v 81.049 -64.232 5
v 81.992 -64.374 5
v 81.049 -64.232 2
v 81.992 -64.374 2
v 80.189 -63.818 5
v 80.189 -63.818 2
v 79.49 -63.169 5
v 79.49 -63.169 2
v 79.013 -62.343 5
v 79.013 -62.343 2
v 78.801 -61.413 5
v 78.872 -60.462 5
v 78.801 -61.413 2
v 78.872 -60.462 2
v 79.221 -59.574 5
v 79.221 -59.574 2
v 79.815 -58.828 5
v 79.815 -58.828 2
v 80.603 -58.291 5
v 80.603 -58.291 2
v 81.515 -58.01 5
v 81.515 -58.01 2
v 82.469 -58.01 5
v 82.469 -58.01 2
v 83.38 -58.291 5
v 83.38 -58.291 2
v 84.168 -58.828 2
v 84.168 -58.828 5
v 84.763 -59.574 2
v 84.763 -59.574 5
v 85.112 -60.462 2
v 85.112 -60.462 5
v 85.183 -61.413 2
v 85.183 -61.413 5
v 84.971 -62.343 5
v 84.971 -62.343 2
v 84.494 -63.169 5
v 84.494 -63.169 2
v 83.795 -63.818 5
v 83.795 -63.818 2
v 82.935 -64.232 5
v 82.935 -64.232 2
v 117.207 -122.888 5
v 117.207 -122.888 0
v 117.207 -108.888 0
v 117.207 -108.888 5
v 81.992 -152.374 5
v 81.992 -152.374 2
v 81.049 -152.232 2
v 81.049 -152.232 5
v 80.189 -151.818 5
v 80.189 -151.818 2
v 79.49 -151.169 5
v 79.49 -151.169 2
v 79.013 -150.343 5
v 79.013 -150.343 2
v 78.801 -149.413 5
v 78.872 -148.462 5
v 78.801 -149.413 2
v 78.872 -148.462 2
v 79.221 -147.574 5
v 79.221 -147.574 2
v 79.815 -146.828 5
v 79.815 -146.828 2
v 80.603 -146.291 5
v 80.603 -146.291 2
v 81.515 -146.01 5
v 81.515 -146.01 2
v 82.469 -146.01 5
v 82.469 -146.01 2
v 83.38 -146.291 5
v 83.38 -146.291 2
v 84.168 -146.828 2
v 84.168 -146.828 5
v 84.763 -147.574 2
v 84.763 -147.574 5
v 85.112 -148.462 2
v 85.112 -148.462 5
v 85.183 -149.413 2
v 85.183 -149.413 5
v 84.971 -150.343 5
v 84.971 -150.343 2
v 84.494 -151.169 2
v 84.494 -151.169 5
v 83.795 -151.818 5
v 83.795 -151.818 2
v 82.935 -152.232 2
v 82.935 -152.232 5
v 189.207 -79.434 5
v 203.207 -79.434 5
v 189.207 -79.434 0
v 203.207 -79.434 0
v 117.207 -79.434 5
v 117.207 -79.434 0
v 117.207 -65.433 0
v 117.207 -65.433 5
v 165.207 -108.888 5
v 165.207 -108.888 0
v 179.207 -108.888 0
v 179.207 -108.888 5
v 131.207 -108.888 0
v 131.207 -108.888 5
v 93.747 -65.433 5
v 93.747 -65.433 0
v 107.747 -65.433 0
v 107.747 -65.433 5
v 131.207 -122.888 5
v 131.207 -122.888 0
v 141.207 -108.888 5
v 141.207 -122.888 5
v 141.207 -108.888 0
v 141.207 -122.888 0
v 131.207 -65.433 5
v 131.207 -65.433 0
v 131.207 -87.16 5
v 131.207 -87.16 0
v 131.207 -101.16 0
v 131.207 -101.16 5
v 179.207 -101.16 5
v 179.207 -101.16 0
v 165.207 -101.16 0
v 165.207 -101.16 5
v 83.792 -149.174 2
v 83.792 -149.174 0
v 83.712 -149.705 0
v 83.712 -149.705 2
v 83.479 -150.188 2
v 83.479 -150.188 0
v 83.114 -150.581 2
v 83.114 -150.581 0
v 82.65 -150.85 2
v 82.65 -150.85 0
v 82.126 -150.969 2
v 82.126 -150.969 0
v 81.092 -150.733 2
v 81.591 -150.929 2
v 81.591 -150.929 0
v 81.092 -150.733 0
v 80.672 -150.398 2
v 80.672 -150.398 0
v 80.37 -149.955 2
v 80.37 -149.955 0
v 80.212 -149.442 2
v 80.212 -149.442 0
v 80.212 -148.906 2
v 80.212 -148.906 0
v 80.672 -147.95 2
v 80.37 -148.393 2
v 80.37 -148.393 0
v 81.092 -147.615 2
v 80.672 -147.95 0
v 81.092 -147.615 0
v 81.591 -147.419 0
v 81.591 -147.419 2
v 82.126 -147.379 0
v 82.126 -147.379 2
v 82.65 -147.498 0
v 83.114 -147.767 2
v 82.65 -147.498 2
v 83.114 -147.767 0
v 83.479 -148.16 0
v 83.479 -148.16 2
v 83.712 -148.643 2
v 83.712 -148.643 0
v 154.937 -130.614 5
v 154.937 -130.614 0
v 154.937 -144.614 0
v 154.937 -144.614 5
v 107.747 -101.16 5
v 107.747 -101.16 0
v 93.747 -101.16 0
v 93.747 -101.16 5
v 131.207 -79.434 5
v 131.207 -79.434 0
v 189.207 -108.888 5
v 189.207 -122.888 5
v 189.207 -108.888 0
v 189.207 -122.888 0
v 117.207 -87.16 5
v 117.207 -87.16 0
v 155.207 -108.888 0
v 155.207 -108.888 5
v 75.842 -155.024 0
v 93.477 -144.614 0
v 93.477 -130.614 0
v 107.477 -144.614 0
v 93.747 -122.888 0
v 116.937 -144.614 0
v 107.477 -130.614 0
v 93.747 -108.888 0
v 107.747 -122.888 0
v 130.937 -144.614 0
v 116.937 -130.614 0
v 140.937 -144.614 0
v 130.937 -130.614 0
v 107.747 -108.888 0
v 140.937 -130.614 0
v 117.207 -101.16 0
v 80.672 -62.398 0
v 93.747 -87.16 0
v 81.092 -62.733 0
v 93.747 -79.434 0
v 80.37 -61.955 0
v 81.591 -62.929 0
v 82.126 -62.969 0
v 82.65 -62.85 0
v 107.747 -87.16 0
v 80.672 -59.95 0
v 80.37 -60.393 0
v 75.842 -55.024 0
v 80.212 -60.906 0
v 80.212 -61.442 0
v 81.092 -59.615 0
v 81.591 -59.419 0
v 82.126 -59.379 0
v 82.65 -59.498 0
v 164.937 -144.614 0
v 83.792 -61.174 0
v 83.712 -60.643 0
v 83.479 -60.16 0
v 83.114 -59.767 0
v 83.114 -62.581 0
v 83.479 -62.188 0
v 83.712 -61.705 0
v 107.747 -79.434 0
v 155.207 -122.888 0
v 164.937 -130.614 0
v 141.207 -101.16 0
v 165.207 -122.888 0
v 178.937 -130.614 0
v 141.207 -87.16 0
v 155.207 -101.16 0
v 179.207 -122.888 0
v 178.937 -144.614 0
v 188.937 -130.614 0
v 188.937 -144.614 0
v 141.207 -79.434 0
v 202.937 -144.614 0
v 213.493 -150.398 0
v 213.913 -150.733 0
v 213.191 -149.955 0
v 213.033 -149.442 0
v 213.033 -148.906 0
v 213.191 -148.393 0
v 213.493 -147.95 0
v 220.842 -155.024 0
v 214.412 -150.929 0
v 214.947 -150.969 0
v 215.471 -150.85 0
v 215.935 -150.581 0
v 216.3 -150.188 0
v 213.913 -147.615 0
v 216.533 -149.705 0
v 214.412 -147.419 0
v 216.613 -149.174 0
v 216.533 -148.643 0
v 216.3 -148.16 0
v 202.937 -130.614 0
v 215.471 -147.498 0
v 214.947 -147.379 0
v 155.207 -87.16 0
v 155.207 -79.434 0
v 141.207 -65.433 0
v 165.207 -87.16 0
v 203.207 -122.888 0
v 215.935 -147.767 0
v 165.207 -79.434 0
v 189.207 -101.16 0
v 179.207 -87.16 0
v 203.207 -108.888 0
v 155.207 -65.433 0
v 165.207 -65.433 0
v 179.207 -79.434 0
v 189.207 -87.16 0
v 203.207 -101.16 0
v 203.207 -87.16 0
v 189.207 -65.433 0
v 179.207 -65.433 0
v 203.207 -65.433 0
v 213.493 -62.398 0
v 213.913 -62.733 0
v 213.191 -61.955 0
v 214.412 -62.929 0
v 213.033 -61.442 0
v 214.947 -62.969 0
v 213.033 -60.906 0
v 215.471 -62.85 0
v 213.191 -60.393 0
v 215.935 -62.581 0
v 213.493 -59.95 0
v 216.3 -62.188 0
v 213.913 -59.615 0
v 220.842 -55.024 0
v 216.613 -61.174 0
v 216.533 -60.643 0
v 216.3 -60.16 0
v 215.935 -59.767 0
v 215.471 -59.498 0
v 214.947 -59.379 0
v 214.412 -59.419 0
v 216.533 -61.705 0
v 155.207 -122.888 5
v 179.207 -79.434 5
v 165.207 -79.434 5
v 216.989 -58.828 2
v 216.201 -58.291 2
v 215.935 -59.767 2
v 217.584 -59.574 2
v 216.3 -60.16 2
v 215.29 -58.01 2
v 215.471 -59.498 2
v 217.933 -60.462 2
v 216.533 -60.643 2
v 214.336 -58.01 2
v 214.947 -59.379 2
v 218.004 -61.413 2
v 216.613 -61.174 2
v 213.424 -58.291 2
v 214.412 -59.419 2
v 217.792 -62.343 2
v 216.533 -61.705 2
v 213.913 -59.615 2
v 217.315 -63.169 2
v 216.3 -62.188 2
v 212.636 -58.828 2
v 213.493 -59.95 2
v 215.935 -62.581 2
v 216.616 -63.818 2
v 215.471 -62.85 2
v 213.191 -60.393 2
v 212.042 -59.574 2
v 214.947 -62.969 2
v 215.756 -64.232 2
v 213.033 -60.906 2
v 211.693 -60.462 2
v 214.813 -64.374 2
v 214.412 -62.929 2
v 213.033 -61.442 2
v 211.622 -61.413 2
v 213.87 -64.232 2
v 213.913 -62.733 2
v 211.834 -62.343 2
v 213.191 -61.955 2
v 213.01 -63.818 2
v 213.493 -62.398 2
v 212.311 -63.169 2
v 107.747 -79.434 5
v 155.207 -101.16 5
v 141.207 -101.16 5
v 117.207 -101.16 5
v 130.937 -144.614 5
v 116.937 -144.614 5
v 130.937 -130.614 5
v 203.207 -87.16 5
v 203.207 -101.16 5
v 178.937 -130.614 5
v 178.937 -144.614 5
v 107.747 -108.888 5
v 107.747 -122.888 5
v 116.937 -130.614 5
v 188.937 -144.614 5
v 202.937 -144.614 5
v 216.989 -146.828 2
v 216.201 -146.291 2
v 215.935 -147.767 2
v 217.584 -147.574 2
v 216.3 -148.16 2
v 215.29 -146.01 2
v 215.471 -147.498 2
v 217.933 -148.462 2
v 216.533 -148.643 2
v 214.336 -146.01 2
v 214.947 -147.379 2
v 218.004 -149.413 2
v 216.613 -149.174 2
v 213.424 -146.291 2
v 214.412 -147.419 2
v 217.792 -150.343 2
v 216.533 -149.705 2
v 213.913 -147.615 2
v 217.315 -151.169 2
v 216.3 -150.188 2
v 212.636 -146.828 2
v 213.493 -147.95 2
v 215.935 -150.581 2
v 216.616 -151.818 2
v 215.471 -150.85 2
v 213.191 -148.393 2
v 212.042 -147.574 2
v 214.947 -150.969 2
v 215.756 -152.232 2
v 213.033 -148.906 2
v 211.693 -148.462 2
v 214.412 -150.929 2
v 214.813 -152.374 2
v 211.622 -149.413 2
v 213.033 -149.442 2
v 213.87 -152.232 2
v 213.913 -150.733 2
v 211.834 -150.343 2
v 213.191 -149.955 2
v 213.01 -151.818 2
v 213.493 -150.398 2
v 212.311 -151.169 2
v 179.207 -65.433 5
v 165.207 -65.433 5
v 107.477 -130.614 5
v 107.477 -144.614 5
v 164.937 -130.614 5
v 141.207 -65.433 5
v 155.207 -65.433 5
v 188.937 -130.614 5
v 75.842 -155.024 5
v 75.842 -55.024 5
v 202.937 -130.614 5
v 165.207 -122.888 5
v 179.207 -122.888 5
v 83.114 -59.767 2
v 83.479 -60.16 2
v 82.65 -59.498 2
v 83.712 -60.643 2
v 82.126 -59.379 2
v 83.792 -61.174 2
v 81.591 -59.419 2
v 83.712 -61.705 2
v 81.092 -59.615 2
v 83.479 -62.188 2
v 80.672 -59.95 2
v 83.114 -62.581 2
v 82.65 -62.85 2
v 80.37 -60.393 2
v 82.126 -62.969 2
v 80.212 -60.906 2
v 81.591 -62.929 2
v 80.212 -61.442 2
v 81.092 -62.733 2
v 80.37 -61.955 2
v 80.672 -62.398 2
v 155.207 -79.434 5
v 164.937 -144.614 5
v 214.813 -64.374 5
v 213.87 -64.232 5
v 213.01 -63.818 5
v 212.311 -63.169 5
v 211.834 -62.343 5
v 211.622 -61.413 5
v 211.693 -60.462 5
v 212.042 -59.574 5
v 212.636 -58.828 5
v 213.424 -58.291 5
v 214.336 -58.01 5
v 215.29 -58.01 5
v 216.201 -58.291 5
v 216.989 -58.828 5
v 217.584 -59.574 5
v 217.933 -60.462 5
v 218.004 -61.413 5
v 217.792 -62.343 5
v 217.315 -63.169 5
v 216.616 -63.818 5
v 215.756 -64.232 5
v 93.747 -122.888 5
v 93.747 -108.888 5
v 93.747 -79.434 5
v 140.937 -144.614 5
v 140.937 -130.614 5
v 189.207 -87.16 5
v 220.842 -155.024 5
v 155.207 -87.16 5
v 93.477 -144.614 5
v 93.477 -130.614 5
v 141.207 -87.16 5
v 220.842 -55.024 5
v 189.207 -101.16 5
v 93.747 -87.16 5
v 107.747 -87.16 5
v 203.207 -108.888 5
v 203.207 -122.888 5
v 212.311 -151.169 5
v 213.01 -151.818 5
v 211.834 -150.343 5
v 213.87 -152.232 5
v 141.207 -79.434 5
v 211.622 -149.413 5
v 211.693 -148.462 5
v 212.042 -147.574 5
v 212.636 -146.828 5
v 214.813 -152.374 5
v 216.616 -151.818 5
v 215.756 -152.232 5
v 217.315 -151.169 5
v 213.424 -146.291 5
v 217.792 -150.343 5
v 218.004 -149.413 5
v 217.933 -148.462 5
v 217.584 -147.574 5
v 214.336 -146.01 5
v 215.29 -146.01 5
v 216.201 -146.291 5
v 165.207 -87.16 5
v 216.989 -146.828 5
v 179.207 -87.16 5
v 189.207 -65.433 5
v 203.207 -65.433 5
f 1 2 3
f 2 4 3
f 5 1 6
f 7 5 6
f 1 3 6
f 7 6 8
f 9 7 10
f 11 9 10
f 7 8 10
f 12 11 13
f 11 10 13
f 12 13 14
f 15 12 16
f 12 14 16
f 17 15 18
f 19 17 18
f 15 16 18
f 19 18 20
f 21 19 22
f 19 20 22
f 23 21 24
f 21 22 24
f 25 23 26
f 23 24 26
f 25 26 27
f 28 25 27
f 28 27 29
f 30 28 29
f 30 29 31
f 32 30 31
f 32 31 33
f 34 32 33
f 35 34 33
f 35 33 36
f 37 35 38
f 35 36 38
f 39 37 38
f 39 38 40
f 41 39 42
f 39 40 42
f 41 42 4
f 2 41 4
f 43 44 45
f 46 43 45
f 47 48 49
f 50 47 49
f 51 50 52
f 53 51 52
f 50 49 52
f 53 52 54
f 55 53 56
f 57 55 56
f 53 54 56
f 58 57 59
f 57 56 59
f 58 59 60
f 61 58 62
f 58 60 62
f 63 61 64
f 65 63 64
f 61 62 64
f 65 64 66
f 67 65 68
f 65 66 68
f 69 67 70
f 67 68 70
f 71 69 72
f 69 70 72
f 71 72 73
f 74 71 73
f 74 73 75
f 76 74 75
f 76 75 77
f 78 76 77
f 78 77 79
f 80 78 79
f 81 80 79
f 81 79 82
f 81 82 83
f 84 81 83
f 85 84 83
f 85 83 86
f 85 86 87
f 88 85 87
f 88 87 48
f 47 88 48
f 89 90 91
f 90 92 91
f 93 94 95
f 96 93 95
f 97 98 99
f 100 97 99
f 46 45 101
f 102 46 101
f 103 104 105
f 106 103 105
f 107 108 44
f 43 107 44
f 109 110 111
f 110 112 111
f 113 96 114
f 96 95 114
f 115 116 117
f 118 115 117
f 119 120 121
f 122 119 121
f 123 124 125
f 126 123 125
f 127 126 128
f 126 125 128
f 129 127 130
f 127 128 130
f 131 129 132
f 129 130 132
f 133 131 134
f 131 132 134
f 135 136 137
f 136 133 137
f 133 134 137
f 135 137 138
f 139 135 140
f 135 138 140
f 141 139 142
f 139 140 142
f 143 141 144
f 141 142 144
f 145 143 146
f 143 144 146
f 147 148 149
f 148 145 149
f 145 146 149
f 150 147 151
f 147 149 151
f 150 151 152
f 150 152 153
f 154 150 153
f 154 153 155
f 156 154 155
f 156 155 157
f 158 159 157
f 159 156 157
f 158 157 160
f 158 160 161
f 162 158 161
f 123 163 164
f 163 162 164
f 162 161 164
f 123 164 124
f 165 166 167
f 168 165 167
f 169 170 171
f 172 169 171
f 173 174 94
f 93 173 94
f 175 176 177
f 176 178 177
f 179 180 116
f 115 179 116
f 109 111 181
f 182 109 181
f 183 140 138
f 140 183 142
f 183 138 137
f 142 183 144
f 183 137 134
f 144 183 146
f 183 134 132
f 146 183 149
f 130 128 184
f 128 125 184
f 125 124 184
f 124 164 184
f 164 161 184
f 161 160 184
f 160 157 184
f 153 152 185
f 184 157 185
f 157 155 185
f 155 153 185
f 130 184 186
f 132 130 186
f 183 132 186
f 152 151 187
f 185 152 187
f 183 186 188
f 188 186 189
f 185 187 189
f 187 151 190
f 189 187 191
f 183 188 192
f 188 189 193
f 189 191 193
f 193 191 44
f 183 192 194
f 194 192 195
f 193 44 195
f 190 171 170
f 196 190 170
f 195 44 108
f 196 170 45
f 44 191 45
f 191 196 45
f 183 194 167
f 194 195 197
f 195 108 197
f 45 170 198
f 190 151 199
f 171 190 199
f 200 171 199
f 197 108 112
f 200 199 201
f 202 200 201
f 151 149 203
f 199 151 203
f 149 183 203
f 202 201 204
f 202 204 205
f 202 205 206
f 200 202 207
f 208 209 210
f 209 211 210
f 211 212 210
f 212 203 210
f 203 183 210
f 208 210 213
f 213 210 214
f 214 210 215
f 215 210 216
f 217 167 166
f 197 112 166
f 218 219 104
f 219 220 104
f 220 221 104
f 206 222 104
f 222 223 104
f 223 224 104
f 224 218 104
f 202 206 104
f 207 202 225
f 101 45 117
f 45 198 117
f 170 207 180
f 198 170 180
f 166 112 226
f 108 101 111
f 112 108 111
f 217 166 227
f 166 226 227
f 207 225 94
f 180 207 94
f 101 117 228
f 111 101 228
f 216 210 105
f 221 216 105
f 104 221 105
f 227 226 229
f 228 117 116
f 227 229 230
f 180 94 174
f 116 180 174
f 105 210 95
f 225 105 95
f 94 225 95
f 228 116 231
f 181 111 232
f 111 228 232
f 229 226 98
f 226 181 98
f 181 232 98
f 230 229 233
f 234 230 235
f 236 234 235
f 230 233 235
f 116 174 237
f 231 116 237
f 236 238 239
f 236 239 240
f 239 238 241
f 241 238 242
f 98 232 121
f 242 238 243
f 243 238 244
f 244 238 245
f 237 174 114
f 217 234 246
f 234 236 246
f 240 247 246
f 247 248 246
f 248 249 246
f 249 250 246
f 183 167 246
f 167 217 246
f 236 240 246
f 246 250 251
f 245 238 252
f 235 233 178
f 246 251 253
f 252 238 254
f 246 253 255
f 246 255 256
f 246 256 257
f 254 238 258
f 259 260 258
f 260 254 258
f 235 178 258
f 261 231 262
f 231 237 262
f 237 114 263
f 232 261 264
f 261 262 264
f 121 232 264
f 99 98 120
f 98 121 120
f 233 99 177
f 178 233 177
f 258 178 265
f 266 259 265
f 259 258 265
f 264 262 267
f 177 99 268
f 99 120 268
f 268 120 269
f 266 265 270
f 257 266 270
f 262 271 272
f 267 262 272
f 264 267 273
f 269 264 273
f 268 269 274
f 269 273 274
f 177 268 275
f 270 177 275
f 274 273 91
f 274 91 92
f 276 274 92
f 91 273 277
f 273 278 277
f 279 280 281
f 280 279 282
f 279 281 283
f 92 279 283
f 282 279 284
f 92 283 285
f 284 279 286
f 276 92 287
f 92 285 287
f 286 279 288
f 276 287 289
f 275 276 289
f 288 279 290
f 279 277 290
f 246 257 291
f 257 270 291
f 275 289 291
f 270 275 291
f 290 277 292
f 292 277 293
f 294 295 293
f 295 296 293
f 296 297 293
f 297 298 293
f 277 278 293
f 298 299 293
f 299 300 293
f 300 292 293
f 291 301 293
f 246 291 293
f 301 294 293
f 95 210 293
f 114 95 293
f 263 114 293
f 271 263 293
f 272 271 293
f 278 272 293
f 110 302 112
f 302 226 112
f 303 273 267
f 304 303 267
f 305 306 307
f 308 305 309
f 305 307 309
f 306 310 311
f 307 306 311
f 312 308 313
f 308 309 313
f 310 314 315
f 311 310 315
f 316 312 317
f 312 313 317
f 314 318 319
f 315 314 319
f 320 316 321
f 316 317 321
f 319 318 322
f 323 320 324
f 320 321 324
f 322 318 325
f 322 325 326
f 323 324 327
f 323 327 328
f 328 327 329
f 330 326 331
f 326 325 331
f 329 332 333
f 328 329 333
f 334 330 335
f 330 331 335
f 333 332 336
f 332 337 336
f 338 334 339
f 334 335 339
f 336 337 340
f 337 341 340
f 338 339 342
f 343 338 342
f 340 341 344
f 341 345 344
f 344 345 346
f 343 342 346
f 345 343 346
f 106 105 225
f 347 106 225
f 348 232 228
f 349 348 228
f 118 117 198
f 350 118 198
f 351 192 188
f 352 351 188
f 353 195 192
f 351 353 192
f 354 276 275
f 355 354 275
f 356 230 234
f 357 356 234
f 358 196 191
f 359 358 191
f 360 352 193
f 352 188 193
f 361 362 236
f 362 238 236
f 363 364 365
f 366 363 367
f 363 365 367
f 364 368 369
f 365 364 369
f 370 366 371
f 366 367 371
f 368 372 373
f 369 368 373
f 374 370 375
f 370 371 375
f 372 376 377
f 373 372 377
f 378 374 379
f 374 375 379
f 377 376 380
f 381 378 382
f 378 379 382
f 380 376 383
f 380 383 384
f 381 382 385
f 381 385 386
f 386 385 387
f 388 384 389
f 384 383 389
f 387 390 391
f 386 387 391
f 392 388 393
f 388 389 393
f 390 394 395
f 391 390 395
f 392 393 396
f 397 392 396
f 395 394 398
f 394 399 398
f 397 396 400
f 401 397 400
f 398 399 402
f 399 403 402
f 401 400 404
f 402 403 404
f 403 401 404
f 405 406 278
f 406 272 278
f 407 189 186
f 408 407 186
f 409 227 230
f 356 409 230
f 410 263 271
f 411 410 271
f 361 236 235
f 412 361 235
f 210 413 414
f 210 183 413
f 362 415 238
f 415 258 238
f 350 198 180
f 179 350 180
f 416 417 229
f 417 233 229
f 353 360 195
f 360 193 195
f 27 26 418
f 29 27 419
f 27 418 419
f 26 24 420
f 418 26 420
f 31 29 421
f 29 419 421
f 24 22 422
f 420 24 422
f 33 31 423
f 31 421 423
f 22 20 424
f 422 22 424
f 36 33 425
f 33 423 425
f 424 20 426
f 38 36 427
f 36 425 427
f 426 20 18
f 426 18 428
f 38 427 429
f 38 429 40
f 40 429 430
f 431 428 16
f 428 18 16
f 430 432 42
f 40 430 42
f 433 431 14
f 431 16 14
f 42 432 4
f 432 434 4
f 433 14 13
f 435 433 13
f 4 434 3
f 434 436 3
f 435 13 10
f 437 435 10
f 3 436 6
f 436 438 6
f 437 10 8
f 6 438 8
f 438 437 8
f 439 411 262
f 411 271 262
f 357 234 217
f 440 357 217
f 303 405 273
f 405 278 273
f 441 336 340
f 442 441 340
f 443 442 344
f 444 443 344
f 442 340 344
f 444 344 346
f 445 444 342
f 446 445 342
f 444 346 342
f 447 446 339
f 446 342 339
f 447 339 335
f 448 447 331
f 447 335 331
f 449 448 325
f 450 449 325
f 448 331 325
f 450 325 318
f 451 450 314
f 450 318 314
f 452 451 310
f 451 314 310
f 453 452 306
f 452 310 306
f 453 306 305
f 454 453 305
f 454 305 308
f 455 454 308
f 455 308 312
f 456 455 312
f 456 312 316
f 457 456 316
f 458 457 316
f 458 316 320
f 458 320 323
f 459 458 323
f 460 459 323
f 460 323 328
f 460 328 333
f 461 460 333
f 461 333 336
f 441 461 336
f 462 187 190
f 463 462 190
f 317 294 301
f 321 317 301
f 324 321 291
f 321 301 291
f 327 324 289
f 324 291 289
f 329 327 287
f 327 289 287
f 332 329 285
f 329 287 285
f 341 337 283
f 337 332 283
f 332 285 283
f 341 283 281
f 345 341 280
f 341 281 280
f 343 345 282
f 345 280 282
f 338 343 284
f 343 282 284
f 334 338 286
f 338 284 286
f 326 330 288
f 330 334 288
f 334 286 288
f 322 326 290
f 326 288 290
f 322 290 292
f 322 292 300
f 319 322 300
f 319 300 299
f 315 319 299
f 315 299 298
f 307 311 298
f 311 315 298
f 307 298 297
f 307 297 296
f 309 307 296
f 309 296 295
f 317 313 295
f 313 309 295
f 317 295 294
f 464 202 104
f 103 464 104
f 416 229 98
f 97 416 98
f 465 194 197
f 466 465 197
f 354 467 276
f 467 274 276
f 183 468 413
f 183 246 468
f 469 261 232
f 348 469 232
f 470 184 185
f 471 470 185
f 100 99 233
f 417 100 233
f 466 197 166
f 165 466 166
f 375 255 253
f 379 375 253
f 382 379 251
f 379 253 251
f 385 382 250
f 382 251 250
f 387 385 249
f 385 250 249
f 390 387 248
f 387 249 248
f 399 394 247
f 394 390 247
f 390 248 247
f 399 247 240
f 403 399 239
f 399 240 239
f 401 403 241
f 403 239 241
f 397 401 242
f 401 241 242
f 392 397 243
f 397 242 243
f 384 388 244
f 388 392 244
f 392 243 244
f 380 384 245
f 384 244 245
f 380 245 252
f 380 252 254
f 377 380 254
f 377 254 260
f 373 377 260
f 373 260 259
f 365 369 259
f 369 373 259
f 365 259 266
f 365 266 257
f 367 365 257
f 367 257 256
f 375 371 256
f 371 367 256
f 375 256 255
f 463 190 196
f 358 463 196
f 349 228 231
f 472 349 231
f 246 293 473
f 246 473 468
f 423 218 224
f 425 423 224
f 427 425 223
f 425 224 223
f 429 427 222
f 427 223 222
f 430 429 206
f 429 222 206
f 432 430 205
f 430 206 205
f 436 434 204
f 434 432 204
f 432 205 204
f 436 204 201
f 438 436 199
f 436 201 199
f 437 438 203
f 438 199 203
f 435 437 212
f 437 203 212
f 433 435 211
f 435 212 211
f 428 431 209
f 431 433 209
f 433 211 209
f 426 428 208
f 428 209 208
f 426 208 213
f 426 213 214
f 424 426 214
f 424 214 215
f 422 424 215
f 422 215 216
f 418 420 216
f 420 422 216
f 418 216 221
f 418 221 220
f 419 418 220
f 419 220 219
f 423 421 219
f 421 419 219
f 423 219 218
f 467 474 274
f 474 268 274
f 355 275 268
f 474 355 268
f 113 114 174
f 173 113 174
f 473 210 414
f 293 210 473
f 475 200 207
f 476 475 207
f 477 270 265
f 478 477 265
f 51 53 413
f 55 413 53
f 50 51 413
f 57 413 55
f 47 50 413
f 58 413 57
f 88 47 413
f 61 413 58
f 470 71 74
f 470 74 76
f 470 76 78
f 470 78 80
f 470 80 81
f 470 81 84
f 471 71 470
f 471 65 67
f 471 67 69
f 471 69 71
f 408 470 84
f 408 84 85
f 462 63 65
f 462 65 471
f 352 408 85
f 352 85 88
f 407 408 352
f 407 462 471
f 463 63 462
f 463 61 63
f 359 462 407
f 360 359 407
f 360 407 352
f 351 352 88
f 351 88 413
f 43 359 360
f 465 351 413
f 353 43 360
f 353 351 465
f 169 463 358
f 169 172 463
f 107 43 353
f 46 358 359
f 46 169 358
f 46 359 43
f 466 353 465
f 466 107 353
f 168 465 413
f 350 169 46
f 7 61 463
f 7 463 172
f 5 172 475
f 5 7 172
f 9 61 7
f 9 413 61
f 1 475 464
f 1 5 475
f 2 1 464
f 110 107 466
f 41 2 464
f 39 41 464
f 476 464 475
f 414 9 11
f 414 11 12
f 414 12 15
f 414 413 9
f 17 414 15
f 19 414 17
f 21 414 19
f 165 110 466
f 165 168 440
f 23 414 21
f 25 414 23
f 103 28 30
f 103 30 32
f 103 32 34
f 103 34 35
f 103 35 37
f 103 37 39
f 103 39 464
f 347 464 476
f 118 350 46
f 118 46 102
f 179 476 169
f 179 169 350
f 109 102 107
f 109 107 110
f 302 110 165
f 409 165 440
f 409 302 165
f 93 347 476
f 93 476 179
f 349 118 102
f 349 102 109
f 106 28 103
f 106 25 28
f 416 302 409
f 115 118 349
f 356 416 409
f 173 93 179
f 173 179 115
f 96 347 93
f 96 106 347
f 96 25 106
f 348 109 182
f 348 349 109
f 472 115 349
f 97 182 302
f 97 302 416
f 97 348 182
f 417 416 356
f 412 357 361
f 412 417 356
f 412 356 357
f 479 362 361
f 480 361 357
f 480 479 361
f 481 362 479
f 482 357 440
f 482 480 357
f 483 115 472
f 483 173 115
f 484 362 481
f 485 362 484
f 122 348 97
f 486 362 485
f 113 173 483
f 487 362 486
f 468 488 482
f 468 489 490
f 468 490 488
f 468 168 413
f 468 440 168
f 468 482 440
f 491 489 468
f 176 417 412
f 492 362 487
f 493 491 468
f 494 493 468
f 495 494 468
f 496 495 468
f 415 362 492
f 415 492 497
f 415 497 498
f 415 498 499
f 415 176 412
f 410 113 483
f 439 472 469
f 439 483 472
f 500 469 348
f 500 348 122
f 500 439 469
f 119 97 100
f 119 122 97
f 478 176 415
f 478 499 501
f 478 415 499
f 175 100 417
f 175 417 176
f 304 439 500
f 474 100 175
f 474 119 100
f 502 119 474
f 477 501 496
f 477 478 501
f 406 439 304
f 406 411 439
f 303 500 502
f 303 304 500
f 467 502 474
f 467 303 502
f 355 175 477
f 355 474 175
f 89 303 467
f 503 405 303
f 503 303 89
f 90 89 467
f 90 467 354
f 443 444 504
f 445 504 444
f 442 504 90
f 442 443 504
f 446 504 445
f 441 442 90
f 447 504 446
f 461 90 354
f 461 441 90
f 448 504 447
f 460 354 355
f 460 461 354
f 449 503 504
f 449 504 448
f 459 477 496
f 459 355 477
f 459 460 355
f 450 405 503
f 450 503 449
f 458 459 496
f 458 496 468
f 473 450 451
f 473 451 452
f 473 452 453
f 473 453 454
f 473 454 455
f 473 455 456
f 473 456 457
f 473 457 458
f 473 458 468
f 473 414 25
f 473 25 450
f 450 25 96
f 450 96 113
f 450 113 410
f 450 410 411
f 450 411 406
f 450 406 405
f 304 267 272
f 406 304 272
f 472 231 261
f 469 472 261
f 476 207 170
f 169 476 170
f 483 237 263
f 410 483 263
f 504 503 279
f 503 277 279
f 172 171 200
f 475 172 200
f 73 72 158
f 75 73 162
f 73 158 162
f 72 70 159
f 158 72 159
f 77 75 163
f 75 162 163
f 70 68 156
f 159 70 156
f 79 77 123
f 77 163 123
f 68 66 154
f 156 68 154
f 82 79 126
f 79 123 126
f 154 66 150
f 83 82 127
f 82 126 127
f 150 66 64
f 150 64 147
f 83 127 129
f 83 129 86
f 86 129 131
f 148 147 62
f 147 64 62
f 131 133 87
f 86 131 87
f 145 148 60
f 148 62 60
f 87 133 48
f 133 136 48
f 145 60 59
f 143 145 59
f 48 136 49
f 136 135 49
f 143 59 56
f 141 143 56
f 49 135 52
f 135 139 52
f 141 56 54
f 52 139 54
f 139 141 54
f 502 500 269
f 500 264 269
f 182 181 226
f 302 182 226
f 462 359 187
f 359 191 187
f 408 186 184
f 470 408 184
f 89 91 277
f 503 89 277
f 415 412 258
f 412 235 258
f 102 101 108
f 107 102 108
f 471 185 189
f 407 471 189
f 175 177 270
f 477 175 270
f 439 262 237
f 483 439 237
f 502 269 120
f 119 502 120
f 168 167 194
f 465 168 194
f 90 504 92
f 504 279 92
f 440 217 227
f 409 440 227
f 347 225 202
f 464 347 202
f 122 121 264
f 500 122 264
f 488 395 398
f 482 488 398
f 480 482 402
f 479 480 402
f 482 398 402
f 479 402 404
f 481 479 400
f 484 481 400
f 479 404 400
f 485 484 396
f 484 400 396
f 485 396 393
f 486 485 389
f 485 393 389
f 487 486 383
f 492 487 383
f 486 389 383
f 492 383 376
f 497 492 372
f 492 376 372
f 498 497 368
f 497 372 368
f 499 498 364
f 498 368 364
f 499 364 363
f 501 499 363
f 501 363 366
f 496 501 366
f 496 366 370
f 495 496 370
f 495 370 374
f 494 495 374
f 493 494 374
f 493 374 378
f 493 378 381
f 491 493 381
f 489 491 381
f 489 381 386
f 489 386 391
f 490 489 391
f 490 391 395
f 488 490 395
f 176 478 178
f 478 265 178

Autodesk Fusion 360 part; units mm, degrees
sketch "Esquisse1" plane through (0, 0, 0) normal (0, 0, 1) x (1, 0, 0)
  line L0 (0.1341, -76.3658) -> (64.4137, -0.1129)
  line L1 (64.4137, -0.1129) -> (129.0708, -76.1647)
  line L2 (129.0708, -76.1647) -> (129.0708, -86.1624)
  line L3 (0.1341, -76.133) -> (11.9451, -86.0425)
  line L4 (129.2084, -85.9931) -> (11.8004, -85.9931)
sketch "Esquisse2" plane through (-56.9768, 0, 48.0303) normal (-0.7646, 0, 0.6445) x (0, -1, 0)
  line L0 (-20.1587, 188.3406) -> (-20.1587, 88.7874)
  line L1 (-20.1587, 88.7874) -> (127.8413, 88.7874)
  line L2 (127.8413, 88.7874) -> (127.8413, 188.3406)
  line L3 (127.8413, 188.3406) -> (-20.1587, 188.3406)
  line L4 (-18.8236, 187.8236) -> (126.1751, 187.8236)
  line L5 (126.1751, 187.8236) -> (126.1751, 87.8252)
  line L6 (126.1751, 87.8252) -> (-18.8236, 87.8252)
  line L7 (-18.8236, 87.8252) -> (-18.8236, 187.8236)
  line L8 (-3.8235, 175.0777) -> (11.1766, 175.0777)
  line L9 (11.1766, 175.0777) -> (11.1766, 160.0776)
  line L10 (11.1766, 160.0776) -> (-3.8235, 160.0776)
  line L11 (-3.8235, 160.0776) -> (-3.8235, 175.0777)
  line L12 (21.1779, 175.0777) -> (36.178, 175.0777)
  line L13 (36.178, 175.0777) -> (36.178, 160.0776)
  line L14 (36.178, 160.0776) -> (21.1779, 160.0776)
  line L15 (21.1779, 160.0776) -> (21.1779, 175.0777)
  line L16 (46.1757, 175.0777) -> (61.1758, 175.0777)
  line L17 (61.1758, 175.0777) -> (61.1758, 160.0776)
  line L18 (61.1758, 160.0776) -> (46.1757, 160.0776)
  line L19 (46.1757, 160.0776) -> (46.1757, 175.0777)
  line L20 (71.1771, 175.0777) -> (86.1772, 175.0777)
  line L21 (86.1772, 175.0777) -> (86.1772, 160.0776)
  line L22 (86.1772, 160.0776) -> (71.1771, 160.0776)
  line L23 (71.1771, 160.0776) -> (71.1771, 175.0777)
  line L24 (96.1749, 175.0777) -> (111.175, 175.0777)
  line L25 (111.175, 175.0777) -> (111.175, 160.0776)
  line L26 (111.175, 160.0776) -> (96.1749, 160.0776)
  line L27 (96.1749, 160.0776) -> (96.1749, 175.0777)
  line L28 (-3.8235, 155.1387) -> (11.1766, 155.1387)
  line L29 (11.1766, 155.1387) -> (11.1766, 140.1386)
  line L30 (11.1766, 140.1386) -> (-3.8235, 140.1386)
  line L31 (-3.8235, 140.1386) -> (-3.8235, 155.1387)
  line L32 (21.1779, 155.1387) -> (36.178, 155.1387)
  line L33 (36.178, 155.1387) -> (36.178, 140.1386)
  line L34 (36.178, 140.1386) -> (21.1779, 140.1386)
  line L35 (21.1779, 140.1386) -> (21.1779, 155.1387)
  line L36 (46.1757, 155.1387) -> (61.1758, 155.1387)
  line L37 (61.1758, 155.1387) -> (61.1758, 140.1386)
  line L38 (61.1758, 140.1386) -> (46.1757, 140.1386)
  line L39 (46.1757, 140.1386) -> (46.1757, 155.1387)
  line L40 (71.1771, 155.1387) -> (86.1772, 155.1387)
  line L41 (86.1772, 155.1387) -> (86.1772, 140.1386)
  line L42 (86.1772, 140.1386) -> (71.1771, 140.1386)
  line L43 (71.1771, 140.1386) -> (71.1771, 155.1387)
  line L44 (96.1749, 155.1387) -> (111.175, 155.1387)
  line L45 (111.175, 155.1387) -> (111.175, 140.1386)
  line L46 (111.175, 140.1386) -> (96.1749, 140.1386)
  line L47 (96.1749, 140.1386) -> (96.1749, 155.1387)
  line L48 (-3.8235, 135.1997) -> (11.1766, 135.1997)
  line L49 (11.1766, 135.1997) -> (11.1766, 120.1996)
  line L50 (11.1766, 120.1996) -> (-3.8235, 120.1996)
  line L51 (-3.8235, 120.1996) -> (-3.8235, 135.1997)
  line L52 (21.1779, 135.1997) -> (36.178, 135.1997)
  line L53 (36.178, 135.1997) -> (36.178, 120.1996)
  line L54 (36.178, 120.1996) -> (21.1779, 120.1996)
  line L55 (21.1779, 120.1996) -> (21.1779, 135.1997)
  line L56 (46.1757, 135.1997) -> (61.1758, 135.1997)
  line L57 (61.1758, 135.1997) -> (61.1758, 120.1996)
  line L58 (61.1758, 120.1996) -> (46.1757, 120.1996)
  line L59 (46.1757, 120.1996) -> (46.1757, 135.1997)
  line L60 (71.1771, 135.1997) -> (86.1772, 135.1997)
  line L61 (86.1772, 135.1997) -> (86.1772, 120.1996)
  line L62 (86.1772, 120.1996) -> (71.1771, 120.1996)
  line L63 (71.1771, 120.1996) -> (71.1771, 135.1997)
  line L64 (96.1749, 135.1997) -> (111.175, 135.1997)
  line L65 (111.175, 135.1997) -> (111.175, 120.1996)
  line L66 (111.175, 120.1996) -> (96.1749, 120.1996)
  line L67 (96.1749, 120.1996) -> (96.1749, 135.1997)
  line L68 (-3.8235, 115.2643) -> (11.1766, 115.2643)
  line L69 (11.1766, 115.2643) -> (11.1766, 100.2642)
  line L70 (11.1766, 100.2642) -> (-3.8235, 100.2642)
  line L71 (-3.8235, 100.2642) -> (-3.8235, 115.2643)
  line L72 (21.1779, 115.2643) -> (36.178, 115.2643)
  line L73 (36.178, 115.2643) -> (36.178, 100.2642)
  line L74 (36.178, 100.2642) -> (21.1779, 100.2642)
  line L75 (21.1779, 100.2642) -> (21.1779, 115.2643)
  line L76 (46.1757, 115.2643) -> (61.1758, 115.2643)
  line L77 (61.1758, 115.2643) -> (61.1758, 100.2642)
  line L78 (61.1758, 100.2642) -> (46.1757, 100.2642)
  line L79 (46.1757, 100.2642) -> (46.1757, 115.2643)
  line L80 (71.1771, 115.2643) -> (86.1772, 115.2643)
  line L81 (86.1772, 115.2643) -> (86.1772, 100.2642)
  line L82 (86.1772, 100.2642) -> (71.1771, 100.2642)
  line L83 (71.1771, 100.2642) -> (71.1771, 115.2643)
  line L84 (96.1749, 115.2643) -> (111.175, 115.2643)
  line L85 (111.175, 115.2643) -> (111.175, 100.2642)
  line L86 (111.175, 100.2642) -> (96.1749, 100.2642)
  line L87 (96.1749, 100.2642) -> (96.1749, 115.2643)
sketch "Esquisse3" plane through (0, -127.8413, 0) normal (0, -1, 0) x (1, 0, 0)
  line L0 (3.7755, 116.2201) -> (64.4218, 188.1629)
  line L1 (64.4218, 188.1629) -> (126.5708, 115.0612)
  line L2 (126.5708, 115.0612) -> (126.5708, 108.6519)
  line L3 (126.5708, 108.6519) -> (12.796, 108.6519)
  line L4 (12.796, 108.6519) -> (3.7755, 116.2201)
  line L5 (0.249, 115.9156) -> (11.8862, 106.1519)
  line L6 (11.8862, 106.1519) -> (129.0708, 106.1519)
  line L7 (129.0708, 106.1519) -> (129.0708, 115.9803)
  line L8 (129.0708, 115.9803) -> (64.4137, 192.0321)
  line L9 (64.4137, 192.0321) -> (0.249, 115.9156)
  line L10 (64.4137, 192.0321) -> (0.249, 115.9156)
  line L11 (11.8862, 106.1519) -> (129.0708, 106.1519)
  line L12 (129.0708, 115.9803) -> (64.4137, 192.0321)
sketch "Esquisse4" plane through (0, 0, 0) normal (0, 0, 1) x (1, 0, 0)
  line L0 (155.2068, -87.1605) -> (155.2068, -101.1605)
  line L1 (165.2068, -65.4335) -> (179.2068, -65.4335)
  line L2 (141.2068, -65.4335) -> (155.2068, -65.4335)
  line L3 (165.2068, -79.4335) -> (165.2068, -65.4335)
  line L4 (107.7472, -87.1605) -> (107.7472, -101.1605)
  line L5 (203.2068, -101.1605) -> (189.2068, -101.1605)
  line L6 (93.7472, -101.1605) -> (93.7472, -87.1605)
  line L7 (93.7472, -79.4335) -> (93.7472, -65.4335)
  line L8 (117.2068, -87.1605) -> (131.2068, -87.1605)
  line L9 (189.2068, -79.4335) -> (189.2068, -65.4335)
  line L10 (179.2068, -79.4335) -> (165.2068, -79.4335)
  line L11 (165.2068, -87.1605) -> (179.2068, -87.1605)
  line L12 (155.2068, -101.1605) -> (141.2068, -101.1605)
  line L13 (93.7472, -87.1605) -> (107.7472, -87.1605)
  line L14 (93.7472, -65.4335) -> (107.7472, -65.4335)
  line L15 (141.2068, -79.4335) -> (141.2068, -65.4335)
  line L16 (155.2068, -79.4335) -> (141.2068, -79.4335)
  line L17 (131.2068, -101.1605) -> (117.2068, -101.1605)
  line L18 (117.2068, -101.1605) -> (117.2068, -87.1605)
  line L19 (131.2068, -65.4335) -> (131.2068, -79.4335)
  line L20 (165.2068, -101.1605) -> (165.2068, -87.1605)
  line L21 (189.2068, -65.4335) -> (203.2068, -65.4335)
  line L22 (141.2068, -101.1605) -> (141.2068, -87.1605)
  line L23 (107.7472, -101.1605) -> (93.7472, -101.1605)
  line L24 (131.2068, -79.4335) -> (117.2068, -79.4335)
  line L25 (141.2068, -87.1605) -> (155.2068, -87.1605)
  line L26 (131.2068, -87.1605) -> (131.2068, -101.1605)
  line L27 (155.2068, -65.4335) -> (155.2068, -79.4335)
  line L28 (107.7472, -65.4335) -> (107.7472, -79.4335)
  line L29 (203.2068, -79.4335) -> (189.2068, -79.4335)
  line L30 (179.2068, -101.1605) -> (165.2068, -101.1605)
  line L31 (179.2068, -87.1605) -> (179.2068, -101.1605)
  line L32 (203.2068, -65.4335) -> (203.2068, -79.4335)
  line L33 (179.2068, -65.4335) -> (179.2068, -79.4335)
  line L34 (117.2068, -79.4335) -> (117.2068, -65.4335)
  circle A0 centre (81.9919, -61.174) radius 1.8
  line L35 (164.9366, -144.6145) -> (164.9366, -130.6145)
  line L36 (107.7472, -79.4335) -> (93.7472, -79.4335)
  line L37 (117.2068, -65.4335) -> (131.2068, -65.4335)
  line L38 (155.2068, -122.8875) -> (141.2068, -122.8875)
  line L39 (178.9366, -130.6145) -> (178.9366, -144.6145)
  line L40 (140.9366, -130.6145) -> (154.9366, -130.6145)
  circle A1 centre (81.9919, -149.174) radius 1.8
  line L41 (220.8419, -155.024) -> (75.8419, -155.024)
  line L42 (188.9366, -144.6145) -> (188.9366, -130.6145)
  line L43 (189.2068, -108.8875) -> (203.2068, -108.8875)
  line L44 (179.2068, -122.8875) -> (165.2068, -122.8875)
  line L45 (130.9366, -144.6145) -> (116.9366, -144.6145)
  line L46 (107.477, -144.6145) -> (93.477, -144.6145)
  line L47 (165.2068, -108.8875) -> (179.2068, -108.8875)
  line L48 (140.9366, -144.6145) -> (140.9366, -130.6145)
  line L49 (189.2068, -87.1605) -> (203.2068, -87.1605)
  line L50 (93.477, -144.6145) -> (93.477, -130.6145)
  line L51 (130.9366, -130.6145) -> (130.9366, -144.6145)
  line L52 (116.9366, -130.6145) -> (130.9366, -130.6145)
  line L53 (75.8419, -55.024) -> (220.8419, -55.024)
  line L54 (141.2068, -108.8875) -> (155.2068, -108.8875)
  line L55 (179.2068, -108.8875) -> (179.2068, -122.8875)
  line L56 (107.7472, -122.8875) -> (93.7472, -122.8875)
  line L57 (75.8419, -155.024) -> (75.8419, -55.024)
  line L58 (93.7472, -122.8875) -> (93.7472, -108.8875)
  line L59 (107.477, -130.6145) -> (107.477, -144.6145)
  line L60 (220.8419, -55.024) -> (220.8419, -155.024)
  line L61 (202.9366, -144.6145) -> (188.9366, -144.6145)
  line L62 (117.2068, -122.8875) -> (117.2068, -108.8875)
  line L63 (117.2068, -108.8875) -> (131.2068, -108.8875)
  line L64 (164.9366, -130.6145) -> (178.9366, -130.6145)
  line L65 (141.2068, -122.8875) -> (141.2068, -108.8875)
  line L66 (154.9366, -130.6145) -> (154.9366, -144.6145)
  line L67 (202.9366, -130.6145) -> (202.9366, -144.6145)
  circle A2 centre (214.8129, -61.174) radius 1.8
  line L68 (203.2068, -108.8875) -> (203.2068, -122.8875)
  line L69 (203.2068, -122.8875) -> (189.2068, -122.8875)
  line L70 (93.7472, -108.8875) -> (107.7472, -108.8875)
  circle A3 centre (214.8129, -149.174) radius 1.8
  line L71 (203.2068, -87.1605) -> (203.2068, -101.1605)
  line L72 (189.2068, -101.1605) -> (189.2068, -87.1605)
  line L73 (189.2068, -122.8875) -> (189.2068, -108.8875)
  line L74 (155.2068, -108.8875) -> (155.2068, -122.8875)
  line L75 (116.9366, -144.6145) -> (116.9366, -130.6145)
  line L76 (188.9366, -130.6145) -> (202.9366, -130.6145)
  line L77 (165.2068, -122.8875) -> (165.2068, -108.8875)
  line L78 (131.2068, -108.8875) -> (131.2068, -122.8875)
  line L79 (154.9366, -144.6145) -> (140.9366, -144.6145)
  line L80 (93.477, -130.6145) -> (107.477, -130.6145)
  line L81 (107.7472, -108.8875) -> (107.7472, -122.8875)
  line L82 (131.2068, -122.8875) -> (117.2068, -122.8875)
  line L83 (178.9366, -144.6145) -> (164.9366, -144.6145)
extrude "Extrusion4" add sketch "Esquisse4" along normal blind 5
hole "Perçage2" at (81.9919, -61.174, 5) direction (0, 0, -1) diameter 3.6 depth 25 tip angle 180 counterbore diameter 6.4 counterbore depth 3
hole "Perçage3" at (81.9919, -149.174, 5) direction (0, 0, -1) diameter 3.6 depth 25 tip angle 180 counterbore diameter 6.4 counterbore depth 3
hole "Perçage4" at (214.8129, -149.174, 5) direction (0, 0, -1) diameter 3.6 depth 25 tip angle 180 counterbore diameter 6.4 counterbore depth 3
hole "Perçage5" at (214.8129, -61.174, 5) direction (0, 0, -1) diameter 3.6 depth 25 tip angle 180 counterbore diameter 6.4 counterbore depth 3
